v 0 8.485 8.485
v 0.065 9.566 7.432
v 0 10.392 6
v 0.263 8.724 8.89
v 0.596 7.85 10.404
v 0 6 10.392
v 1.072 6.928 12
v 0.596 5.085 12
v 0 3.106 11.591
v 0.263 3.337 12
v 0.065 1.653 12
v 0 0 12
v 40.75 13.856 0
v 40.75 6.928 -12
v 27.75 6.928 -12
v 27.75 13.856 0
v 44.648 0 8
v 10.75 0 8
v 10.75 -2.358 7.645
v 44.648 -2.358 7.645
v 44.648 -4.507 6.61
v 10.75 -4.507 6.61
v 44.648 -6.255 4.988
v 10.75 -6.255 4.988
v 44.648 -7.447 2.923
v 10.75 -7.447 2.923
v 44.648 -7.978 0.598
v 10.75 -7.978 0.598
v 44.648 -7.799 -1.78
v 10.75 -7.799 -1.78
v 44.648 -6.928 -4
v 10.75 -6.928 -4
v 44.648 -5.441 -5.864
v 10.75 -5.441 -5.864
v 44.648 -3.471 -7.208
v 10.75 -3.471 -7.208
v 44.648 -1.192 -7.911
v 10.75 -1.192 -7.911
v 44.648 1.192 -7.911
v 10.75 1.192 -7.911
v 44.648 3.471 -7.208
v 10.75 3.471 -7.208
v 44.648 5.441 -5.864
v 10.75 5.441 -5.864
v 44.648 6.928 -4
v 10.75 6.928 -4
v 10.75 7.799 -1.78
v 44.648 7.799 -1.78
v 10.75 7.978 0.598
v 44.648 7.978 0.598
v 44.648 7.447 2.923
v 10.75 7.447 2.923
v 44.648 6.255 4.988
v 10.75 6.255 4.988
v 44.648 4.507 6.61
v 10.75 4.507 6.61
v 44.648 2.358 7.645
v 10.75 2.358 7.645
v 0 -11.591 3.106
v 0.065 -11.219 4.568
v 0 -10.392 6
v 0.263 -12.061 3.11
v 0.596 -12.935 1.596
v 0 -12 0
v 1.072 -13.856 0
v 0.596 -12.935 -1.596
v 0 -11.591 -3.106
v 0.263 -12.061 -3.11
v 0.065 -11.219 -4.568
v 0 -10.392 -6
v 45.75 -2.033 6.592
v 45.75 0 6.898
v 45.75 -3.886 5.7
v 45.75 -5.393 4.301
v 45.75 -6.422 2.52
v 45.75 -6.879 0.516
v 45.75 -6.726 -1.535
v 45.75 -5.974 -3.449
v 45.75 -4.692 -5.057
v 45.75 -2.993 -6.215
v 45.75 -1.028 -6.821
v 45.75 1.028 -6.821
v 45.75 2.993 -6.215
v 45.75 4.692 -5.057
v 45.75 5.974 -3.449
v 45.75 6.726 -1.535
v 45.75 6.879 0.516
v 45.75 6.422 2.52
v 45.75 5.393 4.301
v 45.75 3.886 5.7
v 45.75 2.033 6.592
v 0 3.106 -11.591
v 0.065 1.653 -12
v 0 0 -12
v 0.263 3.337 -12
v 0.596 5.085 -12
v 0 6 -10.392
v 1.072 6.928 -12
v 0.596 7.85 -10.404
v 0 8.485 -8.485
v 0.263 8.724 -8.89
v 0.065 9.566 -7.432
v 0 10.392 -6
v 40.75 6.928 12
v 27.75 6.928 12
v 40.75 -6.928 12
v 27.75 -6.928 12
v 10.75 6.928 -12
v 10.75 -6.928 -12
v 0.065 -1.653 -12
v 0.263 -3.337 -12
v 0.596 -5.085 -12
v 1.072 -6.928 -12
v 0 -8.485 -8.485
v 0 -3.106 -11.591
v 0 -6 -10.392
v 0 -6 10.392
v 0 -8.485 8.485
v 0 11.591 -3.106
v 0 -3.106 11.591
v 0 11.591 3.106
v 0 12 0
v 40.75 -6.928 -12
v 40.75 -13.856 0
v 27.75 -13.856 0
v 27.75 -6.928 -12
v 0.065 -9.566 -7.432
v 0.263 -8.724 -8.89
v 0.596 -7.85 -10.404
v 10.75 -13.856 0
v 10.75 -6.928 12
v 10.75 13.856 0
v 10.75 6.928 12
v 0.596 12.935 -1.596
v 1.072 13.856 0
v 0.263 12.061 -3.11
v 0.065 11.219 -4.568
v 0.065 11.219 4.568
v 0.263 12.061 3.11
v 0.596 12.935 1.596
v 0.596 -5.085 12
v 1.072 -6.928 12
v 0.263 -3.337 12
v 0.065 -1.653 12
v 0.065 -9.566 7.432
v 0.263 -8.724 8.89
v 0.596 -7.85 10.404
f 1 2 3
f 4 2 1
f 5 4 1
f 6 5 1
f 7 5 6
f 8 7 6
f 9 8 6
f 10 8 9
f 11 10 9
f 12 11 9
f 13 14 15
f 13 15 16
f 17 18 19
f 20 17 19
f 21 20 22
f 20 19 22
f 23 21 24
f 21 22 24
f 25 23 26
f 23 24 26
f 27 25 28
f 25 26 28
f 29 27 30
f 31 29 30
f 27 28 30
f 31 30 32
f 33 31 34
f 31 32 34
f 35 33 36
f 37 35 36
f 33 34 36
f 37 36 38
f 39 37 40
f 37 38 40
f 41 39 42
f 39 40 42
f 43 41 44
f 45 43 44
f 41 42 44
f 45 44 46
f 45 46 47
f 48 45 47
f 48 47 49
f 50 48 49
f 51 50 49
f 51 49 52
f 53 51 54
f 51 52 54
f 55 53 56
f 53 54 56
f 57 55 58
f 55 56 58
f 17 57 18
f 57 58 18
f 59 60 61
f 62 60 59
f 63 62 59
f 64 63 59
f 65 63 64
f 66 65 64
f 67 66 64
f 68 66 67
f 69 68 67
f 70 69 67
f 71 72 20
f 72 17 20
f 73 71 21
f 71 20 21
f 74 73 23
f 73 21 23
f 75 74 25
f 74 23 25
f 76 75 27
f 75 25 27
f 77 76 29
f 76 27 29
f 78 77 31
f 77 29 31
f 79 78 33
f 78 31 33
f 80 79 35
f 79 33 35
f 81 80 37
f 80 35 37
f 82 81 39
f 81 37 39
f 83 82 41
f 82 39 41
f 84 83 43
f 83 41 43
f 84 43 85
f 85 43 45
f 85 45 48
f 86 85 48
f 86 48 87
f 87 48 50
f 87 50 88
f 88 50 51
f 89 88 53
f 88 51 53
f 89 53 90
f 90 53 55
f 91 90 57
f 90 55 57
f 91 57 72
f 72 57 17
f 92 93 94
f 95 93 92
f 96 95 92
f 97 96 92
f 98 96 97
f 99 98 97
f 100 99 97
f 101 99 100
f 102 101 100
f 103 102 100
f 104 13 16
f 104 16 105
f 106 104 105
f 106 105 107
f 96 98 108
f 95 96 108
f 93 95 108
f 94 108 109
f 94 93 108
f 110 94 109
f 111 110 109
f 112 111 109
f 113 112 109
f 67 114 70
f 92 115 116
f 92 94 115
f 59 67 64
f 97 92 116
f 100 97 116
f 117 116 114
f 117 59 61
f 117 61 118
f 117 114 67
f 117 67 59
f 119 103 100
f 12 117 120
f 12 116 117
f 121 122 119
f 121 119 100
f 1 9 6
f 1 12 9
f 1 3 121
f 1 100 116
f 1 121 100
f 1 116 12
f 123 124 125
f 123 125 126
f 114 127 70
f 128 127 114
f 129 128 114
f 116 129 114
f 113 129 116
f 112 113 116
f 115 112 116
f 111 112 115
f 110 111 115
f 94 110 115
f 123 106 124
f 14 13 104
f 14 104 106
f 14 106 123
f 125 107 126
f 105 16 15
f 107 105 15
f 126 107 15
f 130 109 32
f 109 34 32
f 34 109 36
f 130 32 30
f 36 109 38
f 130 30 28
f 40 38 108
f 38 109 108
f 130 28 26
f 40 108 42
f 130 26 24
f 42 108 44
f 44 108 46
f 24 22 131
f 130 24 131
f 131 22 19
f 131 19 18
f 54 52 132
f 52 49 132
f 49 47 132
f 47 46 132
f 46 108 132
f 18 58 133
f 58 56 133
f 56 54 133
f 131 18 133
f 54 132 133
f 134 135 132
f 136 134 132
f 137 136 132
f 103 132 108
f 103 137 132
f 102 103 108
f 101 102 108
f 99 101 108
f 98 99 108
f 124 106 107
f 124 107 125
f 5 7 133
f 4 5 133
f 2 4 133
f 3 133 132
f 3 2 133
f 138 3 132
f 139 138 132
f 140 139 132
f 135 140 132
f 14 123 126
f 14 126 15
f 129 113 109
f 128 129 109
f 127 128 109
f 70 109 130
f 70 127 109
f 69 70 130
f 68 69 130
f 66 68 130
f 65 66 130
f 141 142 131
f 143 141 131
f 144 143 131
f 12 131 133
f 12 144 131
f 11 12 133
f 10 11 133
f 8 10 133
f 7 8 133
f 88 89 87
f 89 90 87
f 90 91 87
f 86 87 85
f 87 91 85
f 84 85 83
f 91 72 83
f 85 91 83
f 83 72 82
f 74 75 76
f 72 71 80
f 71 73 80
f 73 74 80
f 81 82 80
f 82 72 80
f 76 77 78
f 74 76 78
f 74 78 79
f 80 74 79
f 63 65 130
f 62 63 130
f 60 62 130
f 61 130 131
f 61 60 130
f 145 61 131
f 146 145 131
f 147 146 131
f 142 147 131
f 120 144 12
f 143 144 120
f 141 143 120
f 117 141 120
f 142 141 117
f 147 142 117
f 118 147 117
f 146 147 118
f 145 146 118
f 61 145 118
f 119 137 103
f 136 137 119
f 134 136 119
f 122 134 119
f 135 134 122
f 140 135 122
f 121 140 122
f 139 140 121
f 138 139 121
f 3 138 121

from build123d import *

# Parameters (mm, degrees)
BASEHEAD_DEPTH      = 10.75
BOSS_EXTRUDE1_DEPTH = 13


with BuildPart() as part:
    # Sketch1 → BaseHead (new body)
    with BuildSketch(Plane(origin=(0, 0, 0), x_dir=(0, 0, -1), z_dir=(1, 0, 0))):
        Polygon((12, 6.92820323), (12, -6.92820323), (0, -13.856406461), (-12, -6.92820323), (-12, 6.92820323), (0, 13.856406461), align=None)
    extrude(amount=BASEHEAD_DEPTH)

    # BodySke → BaseBody (revolve)
    with BuildSketch(Plane.XY, mode=Mode.PRIVATE) as basebody_sk:
        Polygon((0, 0), (45.75, 0), (45.75, 6.8985), (44.6485, 8), (0, 8), align=None)
    revolve(basebody_sk.sketch.rotate(Axis((0, 0, 0), (1, 0, 0)), 90), axis=Axis((0, 0, 0), (1, 0, 0)))

    # Sketch3 → HeadChamfer (revolve, cut)
    with BuildSketch(Plane.XY):
        Polygon((0, 12), (3.958548116, 18.856406461), (3.958548116, 23.856406461), (-10, 23.856406461), (-10, 12), align=None)
    revolve(axis=Axis((0, 0, 0), (1, 0, 0)), mode=Mode.SUBTRACT)


with BuildPart() as body_2:
    # Sketch4 → Boss-Extrude1 (new body)
    with BuildSketch(Plane(origin=(40.75, 0, 0), x_dir=(0, 0, -1), z_dir=(1, 0, 0))):
        Polygon((0, 13.856406461), (-12, 6.92820323), (-12, -6.92820323), (0, -13.856406461), (12, -6.92820323), (12, 6.92820323), align=None)
    extrude(amount=-BOSS_EXTRUDE1_DEPTH)


solid = Compound([part.part, body_2.part])
